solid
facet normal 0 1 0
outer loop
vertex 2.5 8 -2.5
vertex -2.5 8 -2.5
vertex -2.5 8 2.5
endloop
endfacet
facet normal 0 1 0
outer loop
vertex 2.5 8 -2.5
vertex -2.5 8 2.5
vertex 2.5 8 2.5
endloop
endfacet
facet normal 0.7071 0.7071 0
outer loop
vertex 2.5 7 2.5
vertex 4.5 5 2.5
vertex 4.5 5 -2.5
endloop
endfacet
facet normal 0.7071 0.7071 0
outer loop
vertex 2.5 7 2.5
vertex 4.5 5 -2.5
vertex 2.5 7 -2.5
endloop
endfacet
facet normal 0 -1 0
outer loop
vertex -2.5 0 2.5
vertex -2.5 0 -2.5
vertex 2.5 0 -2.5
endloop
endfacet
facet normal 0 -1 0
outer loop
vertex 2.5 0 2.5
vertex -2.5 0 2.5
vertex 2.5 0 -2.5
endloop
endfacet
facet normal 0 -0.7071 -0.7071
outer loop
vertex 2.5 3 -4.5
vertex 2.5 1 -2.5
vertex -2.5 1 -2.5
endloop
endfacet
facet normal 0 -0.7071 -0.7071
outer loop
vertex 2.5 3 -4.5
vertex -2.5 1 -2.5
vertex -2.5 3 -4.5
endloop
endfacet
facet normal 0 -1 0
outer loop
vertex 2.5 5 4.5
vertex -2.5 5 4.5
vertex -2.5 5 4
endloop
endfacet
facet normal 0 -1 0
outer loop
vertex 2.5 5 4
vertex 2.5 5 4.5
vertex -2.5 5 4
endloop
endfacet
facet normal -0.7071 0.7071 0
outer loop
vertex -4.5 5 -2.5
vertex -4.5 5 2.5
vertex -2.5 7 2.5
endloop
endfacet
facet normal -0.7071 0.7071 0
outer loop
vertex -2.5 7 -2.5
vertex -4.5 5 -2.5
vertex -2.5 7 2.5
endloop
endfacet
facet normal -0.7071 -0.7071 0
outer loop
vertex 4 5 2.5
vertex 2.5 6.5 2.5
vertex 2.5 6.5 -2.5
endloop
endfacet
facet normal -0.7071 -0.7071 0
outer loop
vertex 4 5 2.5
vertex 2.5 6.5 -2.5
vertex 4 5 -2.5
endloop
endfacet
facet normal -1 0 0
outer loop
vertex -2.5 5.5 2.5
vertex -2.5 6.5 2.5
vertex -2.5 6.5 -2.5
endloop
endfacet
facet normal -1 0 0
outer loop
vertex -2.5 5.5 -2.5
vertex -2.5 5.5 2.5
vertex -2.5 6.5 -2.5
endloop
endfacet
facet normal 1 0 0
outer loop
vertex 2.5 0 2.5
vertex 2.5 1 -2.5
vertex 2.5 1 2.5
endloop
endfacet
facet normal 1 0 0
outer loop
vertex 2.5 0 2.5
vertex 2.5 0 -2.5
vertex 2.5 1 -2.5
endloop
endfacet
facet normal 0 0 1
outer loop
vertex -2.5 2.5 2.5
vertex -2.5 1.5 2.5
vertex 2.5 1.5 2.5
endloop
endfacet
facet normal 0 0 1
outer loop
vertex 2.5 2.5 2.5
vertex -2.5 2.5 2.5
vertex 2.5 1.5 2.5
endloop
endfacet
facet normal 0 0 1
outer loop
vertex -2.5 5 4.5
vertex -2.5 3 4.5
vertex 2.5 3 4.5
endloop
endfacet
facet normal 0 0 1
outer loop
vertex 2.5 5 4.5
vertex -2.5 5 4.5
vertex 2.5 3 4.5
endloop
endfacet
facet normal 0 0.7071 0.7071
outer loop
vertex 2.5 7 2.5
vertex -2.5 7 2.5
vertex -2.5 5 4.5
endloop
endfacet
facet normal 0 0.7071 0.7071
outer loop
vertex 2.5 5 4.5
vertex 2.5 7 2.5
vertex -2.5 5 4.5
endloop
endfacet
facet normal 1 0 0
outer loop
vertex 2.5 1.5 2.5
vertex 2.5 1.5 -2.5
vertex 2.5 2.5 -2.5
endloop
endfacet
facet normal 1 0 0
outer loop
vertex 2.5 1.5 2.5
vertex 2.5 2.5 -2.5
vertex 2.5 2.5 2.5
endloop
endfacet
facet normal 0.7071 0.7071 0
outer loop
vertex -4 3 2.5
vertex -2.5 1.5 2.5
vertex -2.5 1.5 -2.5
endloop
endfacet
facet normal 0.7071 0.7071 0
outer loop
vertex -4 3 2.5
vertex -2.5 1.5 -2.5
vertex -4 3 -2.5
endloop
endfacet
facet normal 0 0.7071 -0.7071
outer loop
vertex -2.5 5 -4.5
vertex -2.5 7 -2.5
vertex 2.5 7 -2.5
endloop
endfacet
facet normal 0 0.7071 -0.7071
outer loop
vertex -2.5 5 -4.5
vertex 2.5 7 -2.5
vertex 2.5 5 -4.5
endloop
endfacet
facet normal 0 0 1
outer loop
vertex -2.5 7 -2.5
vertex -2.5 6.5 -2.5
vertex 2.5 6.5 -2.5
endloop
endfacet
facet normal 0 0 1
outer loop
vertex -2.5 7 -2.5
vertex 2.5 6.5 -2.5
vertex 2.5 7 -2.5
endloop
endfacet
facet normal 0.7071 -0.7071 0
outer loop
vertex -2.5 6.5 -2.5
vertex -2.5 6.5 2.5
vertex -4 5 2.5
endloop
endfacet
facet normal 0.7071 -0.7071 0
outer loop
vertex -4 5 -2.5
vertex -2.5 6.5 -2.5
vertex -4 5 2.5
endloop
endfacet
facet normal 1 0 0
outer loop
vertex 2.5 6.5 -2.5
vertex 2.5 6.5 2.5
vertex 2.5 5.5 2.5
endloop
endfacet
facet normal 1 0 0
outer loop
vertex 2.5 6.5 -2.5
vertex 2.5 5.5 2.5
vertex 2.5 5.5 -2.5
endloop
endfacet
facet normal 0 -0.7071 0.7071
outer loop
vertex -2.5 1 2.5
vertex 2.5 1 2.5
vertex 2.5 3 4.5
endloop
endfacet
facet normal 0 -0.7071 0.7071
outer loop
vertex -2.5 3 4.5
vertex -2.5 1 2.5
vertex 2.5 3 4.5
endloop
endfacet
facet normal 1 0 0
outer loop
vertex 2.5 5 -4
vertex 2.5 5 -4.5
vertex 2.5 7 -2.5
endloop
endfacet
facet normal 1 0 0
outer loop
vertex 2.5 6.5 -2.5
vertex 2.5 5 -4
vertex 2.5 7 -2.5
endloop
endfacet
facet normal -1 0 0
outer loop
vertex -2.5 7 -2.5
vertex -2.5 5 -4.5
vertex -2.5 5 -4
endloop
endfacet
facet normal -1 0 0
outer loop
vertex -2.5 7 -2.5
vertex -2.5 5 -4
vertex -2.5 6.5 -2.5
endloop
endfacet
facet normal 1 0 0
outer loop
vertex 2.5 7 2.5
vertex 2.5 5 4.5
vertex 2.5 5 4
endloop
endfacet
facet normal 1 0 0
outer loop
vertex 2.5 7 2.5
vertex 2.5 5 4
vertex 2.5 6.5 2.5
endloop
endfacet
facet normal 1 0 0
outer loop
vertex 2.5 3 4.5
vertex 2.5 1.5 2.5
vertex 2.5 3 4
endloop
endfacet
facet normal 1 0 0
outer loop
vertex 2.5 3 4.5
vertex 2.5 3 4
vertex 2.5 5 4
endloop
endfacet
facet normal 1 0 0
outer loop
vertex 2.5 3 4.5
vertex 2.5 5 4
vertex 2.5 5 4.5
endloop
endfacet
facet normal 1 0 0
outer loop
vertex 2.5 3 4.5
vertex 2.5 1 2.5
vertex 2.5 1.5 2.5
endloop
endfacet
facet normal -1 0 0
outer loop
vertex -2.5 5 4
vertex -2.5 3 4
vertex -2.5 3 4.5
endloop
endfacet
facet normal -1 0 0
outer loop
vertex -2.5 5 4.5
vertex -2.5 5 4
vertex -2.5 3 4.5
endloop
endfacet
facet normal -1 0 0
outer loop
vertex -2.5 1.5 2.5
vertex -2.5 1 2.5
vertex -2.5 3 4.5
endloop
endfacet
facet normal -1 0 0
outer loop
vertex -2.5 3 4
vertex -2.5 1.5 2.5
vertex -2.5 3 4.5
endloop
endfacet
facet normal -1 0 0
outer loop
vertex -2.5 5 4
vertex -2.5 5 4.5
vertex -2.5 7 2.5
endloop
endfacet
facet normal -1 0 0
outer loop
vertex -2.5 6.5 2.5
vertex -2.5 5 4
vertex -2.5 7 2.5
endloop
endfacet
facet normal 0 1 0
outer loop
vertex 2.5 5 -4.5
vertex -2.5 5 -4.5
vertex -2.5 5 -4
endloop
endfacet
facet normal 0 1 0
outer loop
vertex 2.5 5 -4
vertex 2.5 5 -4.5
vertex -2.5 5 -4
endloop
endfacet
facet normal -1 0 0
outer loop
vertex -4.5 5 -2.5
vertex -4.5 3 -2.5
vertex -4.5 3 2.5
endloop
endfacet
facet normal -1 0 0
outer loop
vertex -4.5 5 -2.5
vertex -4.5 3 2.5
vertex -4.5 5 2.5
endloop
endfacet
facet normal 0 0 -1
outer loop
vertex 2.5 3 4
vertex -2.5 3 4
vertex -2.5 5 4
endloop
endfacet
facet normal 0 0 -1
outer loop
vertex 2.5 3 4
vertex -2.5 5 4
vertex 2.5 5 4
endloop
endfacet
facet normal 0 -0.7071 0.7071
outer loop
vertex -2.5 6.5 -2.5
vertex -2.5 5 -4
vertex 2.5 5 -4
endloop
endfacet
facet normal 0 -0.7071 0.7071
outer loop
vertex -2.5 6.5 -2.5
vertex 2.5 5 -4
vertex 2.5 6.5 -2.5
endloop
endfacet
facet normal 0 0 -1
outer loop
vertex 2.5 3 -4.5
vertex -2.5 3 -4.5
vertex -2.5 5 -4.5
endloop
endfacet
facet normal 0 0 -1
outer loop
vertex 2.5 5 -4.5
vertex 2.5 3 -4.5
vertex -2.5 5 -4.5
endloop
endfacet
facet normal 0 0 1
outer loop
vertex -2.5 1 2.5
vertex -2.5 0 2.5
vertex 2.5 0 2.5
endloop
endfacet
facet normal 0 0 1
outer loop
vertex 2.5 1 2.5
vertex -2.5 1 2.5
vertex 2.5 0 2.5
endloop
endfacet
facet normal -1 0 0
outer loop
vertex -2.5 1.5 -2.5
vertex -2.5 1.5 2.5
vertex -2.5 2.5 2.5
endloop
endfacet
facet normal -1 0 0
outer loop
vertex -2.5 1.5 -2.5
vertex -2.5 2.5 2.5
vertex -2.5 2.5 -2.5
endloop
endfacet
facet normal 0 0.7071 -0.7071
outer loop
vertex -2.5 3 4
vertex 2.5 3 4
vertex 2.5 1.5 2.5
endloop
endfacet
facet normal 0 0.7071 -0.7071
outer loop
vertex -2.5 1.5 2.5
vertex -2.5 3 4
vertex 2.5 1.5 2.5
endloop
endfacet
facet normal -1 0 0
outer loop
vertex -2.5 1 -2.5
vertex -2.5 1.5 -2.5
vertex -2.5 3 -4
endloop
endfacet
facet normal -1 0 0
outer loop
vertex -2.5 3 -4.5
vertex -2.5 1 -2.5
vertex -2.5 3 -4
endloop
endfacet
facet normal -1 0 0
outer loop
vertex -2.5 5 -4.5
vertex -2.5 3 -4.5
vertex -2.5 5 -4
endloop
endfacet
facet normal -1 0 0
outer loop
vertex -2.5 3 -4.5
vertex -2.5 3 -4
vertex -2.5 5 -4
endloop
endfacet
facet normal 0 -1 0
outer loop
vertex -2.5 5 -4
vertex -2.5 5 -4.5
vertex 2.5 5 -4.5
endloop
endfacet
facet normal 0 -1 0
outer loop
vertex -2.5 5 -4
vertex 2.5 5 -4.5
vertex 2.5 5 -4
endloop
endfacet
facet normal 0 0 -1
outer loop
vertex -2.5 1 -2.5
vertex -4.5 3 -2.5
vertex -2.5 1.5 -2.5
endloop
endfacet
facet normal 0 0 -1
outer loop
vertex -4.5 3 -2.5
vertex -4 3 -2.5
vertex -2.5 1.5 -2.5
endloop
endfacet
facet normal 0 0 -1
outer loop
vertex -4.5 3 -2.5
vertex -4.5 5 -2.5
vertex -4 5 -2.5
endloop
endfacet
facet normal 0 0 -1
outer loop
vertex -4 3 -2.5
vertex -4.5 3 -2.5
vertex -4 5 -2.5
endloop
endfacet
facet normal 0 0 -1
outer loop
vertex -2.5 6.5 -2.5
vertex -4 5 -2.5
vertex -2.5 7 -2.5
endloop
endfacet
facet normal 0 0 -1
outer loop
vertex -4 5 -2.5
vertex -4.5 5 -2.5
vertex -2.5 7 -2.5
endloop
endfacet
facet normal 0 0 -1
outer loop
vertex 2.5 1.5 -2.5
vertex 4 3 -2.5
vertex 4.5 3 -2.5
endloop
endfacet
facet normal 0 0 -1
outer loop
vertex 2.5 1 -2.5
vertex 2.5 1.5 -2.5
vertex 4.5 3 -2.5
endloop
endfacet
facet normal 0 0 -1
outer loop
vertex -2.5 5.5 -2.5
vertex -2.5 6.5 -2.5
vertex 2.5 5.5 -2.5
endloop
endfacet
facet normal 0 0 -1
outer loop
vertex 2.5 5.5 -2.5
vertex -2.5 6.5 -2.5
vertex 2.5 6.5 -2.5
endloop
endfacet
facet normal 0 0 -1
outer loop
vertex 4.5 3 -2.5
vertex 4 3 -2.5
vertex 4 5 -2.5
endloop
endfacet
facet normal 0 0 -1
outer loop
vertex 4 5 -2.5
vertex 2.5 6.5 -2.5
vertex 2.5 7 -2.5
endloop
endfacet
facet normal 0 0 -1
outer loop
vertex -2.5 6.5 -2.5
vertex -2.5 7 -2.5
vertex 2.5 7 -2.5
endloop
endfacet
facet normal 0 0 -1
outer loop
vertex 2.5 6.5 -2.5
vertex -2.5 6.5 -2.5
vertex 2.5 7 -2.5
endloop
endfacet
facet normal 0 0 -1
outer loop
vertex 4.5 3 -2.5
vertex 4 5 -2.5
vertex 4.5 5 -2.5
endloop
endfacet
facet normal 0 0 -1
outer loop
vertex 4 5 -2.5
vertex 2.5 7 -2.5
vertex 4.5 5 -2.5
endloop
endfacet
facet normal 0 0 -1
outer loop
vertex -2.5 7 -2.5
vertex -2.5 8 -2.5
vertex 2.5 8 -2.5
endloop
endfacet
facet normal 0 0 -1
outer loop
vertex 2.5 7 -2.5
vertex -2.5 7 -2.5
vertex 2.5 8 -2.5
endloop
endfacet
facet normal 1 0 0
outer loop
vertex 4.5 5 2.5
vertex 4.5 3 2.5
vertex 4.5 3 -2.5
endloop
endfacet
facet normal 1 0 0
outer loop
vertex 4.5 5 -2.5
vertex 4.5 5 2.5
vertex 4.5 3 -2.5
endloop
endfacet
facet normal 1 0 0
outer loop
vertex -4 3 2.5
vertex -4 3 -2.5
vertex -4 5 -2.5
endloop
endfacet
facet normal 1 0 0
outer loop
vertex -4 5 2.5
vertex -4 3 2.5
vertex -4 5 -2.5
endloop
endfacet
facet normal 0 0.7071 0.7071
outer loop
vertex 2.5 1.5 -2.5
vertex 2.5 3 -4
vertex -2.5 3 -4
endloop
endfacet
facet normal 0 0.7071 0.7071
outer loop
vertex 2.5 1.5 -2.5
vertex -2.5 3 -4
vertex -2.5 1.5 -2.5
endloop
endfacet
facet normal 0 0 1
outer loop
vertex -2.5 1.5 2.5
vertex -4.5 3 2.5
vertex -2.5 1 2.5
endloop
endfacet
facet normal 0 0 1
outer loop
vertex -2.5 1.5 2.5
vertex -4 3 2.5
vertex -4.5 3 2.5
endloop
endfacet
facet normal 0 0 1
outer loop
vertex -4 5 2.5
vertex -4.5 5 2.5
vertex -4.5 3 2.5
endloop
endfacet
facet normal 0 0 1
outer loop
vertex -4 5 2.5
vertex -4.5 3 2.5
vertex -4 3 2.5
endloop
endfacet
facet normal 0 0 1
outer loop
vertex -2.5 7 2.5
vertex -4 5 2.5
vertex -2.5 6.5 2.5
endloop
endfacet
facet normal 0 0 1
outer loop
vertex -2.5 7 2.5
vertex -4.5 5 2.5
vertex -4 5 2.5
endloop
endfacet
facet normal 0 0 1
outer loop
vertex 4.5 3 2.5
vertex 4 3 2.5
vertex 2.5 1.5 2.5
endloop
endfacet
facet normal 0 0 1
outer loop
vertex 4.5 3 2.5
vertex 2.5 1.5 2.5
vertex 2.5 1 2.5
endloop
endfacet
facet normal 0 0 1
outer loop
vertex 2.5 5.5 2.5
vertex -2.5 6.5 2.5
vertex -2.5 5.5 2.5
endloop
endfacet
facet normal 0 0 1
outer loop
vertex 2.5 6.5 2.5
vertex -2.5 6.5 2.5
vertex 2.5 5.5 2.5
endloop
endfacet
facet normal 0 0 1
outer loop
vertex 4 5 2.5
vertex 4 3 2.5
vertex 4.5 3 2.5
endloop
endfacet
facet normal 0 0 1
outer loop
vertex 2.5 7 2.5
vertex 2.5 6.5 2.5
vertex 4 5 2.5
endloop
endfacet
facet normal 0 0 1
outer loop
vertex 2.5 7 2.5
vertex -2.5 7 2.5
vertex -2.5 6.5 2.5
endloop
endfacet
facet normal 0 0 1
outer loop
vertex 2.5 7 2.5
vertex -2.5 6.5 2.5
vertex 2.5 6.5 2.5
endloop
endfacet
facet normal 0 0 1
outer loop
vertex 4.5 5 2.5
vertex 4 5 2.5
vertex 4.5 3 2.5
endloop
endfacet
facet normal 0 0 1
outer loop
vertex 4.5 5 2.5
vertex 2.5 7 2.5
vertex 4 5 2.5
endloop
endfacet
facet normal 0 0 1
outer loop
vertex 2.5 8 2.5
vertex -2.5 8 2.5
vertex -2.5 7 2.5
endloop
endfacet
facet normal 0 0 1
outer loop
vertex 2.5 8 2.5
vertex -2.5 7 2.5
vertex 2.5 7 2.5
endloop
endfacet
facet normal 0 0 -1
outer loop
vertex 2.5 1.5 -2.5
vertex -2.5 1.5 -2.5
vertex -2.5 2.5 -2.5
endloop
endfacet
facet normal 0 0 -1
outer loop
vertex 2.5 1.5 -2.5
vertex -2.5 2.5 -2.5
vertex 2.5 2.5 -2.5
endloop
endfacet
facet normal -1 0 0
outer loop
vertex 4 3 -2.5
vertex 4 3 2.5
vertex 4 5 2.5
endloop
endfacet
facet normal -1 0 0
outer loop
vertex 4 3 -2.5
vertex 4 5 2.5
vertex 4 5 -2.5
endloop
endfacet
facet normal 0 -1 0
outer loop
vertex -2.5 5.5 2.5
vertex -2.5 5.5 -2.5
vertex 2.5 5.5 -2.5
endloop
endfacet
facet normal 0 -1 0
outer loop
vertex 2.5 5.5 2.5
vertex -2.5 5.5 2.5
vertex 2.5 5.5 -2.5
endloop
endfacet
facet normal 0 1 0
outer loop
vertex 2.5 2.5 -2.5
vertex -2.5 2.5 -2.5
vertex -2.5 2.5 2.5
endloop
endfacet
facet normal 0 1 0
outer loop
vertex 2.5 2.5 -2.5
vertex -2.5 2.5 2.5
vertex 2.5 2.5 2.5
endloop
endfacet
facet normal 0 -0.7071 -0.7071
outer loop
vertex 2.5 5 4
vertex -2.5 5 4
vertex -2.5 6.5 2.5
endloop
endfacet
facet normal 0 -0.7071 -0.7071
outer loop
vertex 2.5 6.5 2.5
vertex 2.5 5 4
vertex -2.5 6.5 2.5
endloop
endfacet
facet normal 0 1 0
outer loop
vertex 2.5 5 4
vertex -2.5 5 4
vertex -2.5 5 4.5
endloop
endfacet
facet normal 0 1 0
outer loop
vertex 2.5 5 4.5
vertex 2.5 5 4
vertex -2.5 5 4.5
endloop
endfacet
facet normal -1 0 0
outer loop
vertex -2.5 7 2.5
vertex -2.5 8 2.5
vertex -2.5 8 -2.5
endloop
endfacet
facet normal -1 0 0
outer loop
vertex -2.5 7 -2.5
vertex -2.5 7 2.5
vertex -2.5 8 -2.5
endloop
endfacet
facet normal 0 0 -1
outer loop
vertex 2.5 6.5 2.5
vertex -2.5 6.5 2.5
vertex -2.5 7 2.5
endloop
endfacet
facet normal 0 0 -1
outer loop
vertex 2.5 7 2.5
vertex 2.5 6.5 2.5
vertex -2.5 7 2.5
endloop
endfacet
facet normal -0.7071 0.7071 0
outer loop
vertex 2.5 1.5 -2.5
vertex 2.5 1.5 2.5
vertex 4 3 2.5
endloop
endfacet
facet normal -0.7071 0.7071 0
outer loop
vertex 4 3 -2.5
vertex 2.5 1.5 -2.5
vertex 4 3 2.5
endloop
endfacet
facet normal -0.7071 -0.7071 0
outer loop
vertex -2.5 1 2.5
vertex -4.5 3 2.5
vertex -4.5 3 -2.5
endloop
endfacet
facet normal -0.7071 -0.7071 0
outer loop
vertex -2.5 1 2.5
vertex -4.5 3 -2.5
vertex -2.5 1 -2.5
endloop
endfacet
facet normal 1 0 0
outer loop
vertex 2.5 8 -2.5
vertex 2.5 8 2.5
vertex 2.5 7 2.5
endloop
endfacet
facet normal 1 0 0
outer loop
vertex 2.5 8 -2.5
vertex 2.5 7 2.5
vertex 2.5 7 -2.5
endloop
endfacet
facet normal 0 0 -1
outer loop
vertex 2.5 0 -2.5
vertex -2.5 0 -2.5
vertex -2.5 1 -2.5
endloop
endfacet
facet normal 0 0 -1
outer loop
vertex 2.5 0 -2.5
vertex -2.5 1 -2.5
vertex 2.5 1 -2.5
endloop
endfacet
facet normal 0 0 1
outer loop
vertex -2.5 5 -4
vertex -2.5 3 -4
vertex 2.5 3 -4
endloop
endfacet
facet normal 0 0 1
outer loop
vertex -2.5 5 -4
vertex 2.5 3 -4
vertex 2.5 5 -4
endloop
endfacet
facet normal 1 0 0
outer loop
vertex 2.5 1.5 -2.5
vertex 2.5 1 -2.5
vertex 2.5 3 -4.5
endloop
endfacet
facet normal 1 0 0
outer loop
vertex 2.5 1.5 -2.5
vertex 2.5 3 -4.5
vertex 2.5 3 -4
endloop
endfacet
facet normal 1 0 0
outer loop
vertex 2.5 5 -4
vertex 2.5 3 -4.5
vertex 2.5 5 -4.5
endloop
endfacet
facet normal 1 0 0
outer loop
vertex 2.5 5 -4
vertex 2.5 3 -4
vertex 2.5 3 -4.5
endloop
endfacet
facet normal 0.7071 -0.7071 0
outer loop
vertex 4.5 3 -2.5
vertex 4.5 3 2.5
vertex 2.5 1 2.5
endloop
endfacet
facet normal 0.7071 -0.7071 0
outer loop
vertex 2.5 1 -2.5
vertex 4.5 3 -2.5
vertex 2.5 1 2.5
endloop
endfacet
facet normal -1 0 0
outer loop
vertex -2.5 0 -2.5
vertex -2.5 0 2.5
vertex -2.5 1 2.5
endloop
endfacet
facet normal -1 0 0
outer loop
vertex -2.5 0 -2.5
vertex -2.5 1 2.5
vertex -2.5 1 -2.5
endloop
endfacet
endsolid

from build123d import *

# Parameters (mm, degrees)
SKETCH2_W            = 5
SKETCH2_H            = 5
BOSS_EXTRUDE1_DEPTH  = 2.5
BOSS_EXTRUDE2_DEPTH  = 5
BOSS_EXTRUDE3_DEPTH  = 5
SKETCH5_W            = 0.5
SKETCH5_H            = 5
BOSS_EXTRUDE4_DEPTH  = 1
SKETCH6_W            = 5
SKETCH6_H            = 0.5
BOSS_EXTRUDE5_DEPTH  = 1
MIRROR3_START        = -2.5
MIRROR3_OUTLINE_W    = 0.5
MIRROR3_OUTLINE_H    = 1
MIRROR3_DEPTH        = 5
MIRROR5_COPY_1_DEPTH = 5
MIRROR5_COPY_2_DEPTH = 5
MIRROR6_START        = -2.5
MIRROR6_OUTLINE_W    = 1
MIRROR6_OUTLINE_H    = 0.5
MIRROR6_DEPTH        = 5
BOSS_EXTRUDE7_DEPTH  = 5
BOSS_EXTRUDE9_DEPTH  = 5


# Read off the part's stored shape, not the designer's step: Mirror3, Mirror6
with BuildPart() as part:
    # Sketch2 → Boss-Extrude1 (new body)
    with BuildSketch(Plane(origin=(0, 0, 0), x_dir=(1, 0, 0), z_dir=(0, 1, 0))):
        Rectangle(SKETCH2_W, SKETCH2_H)
    boss_extrude1 = extrude(amount=BOSS_EXTRUDE1_DEPTH)

    # Sketch3 → Boss-Extrude2 (add)
    with BuildSketch(Plane.XY.offset(2.5)):
        Polygon((-2.5, 1.5), (-4, 3), (-4.5, 3), (-2.5, 1), align=None)
    boss_extrude2 = extrude(amount=-BOSS_EXTRUDE2_DEPTH)

    # Sketch4 → Boss-Extrude3 (add)
    with BuildSketch(Plane(origin=(2.5, 0, 0), x_dir=(0, 0, -1), z_dir=(1, 0, 0))):
        Polygon((2.5, 1.5), (2.5, 1), (4.5, 3), (4, 3), align=None)
    boss_extrude3 = extrude(amount=-BOSS_EXTRUDE3_DEPTH)

    # Sketch5 → Boss-Extrude4 (add)
    with BuildSketch(Plane(origin=(0, 3, 0), x_dir=(1, 0, 0), z_dir=(0, 1, 0))):
        with Locations((-4.25, 0)):
            Rectangle(SKETCH5_W, SKETCH5_H)
    boss_extrude4 = extrude(amount=BOSS_EXTRUDE4_DEPTH)

    # Sketch6 → Boss-Extrude5 (add)
    with BuildSketch(Plane(origin=(0, 3, 0), x_dir=(1, 0, 0), z_dir=(0, 1, 0))):
        with Locations((0, 4.25)):
            Rectangle(SKETCH6_W, SKETCH6_H)
    boss_extrude5 = extrude(amount=BOSS_EXTRUDE5_DEPTH)

    # Mirror1: Boss-Extrude3, Boss-Extrude5 across plane
    add(boss_extrude3.mirror(Plane.XY))
    add(boss_extrude5.mirror(Plane.XY))

    # Mirror2: Boss-Extrude2, Boss-Extrude4 across plane
    add(boss_extrude2.mirror(Plane(origin=(0, 0, 0), x_dir=(0, 0, 1), z_dir=(1, 0, 0))))
    add(boss_extrude4.mirror(Plane(origin=(0, 0, 0), x_dir=(0, 0, 1), z_dir=(1, 0, 0))))

    # Mirror3 outline → Mirror3 (add)
    with BuildSketch(Plane.XY.offset(MIRROR3_START)):
        with Locations((-4.25, 4.5)):
            Rectangle(MIRROR3_OUTLINE_W, MIRROR3_OUTLINE_H)
        with Locations((4.25, 4.5)):
            Rectangle(MIRROR3_OUTLINE_W, MIRROR3_OUTLINE_H)
    extrude(amount=MIRROR3_DEPTH)

    # Mirror4: Boss-Extrude2 across plane
    add(boss_extrude2.mirror(Plane.ZX.offset(4)))

    # Mirror5 copy 1 sketch → Mirror5 copy 1 (add)
    with BuildSketch(Plane(origin=(0, 8, 2.5), x_dir=(-1, 0, 0), z_dir=(0, 0, 1))):
        Polygon((-2.5, 1.5), (-4, 3), (-4.5, 3), (-2.5, 1), align=None)
    extrude(amount=-MIRROR5_COPY_1_DEPTH)

    # Mirror5 copy 2 sketch → Mirror5 copy 2 (add)
    with BuildSketch(Plane(origin=(0, 0, 2.5), x_dir=(-1, 0, 0), z_dir=(0, 0, 1))):
        Polygon((-2.5, -1.5), (-4, -3), (-4.5, -3), (-2.5, -1), align=None)
    extrude(amount=-MIRROR5_COPY_2_DEPTH)

    # Mirror6 outline → Mirror6 (add)
    with BuildSketch(Plane.YZ.offset(MIRROR6_START)):
        with Locations((4.5, -4.25)):
            Rectangle(MIRROR6_OUTLINE_W, MIRROR6_OUTLINE_H)
        with Locations((4.5, 4.25)):
            Rectangle(MIRROR6_OUTLINE_W, MIRROR6_OUTLINE_H)
    extrude(amount=MIRROR6_DEPTH)

    # Mirror10: Boss-Extrude1 across plane
    add(boss_extrude1.mirror(Plane.ZX.offset(4)))


with BuildPart() as body_2:
    # Sketch7 → Boss-Extrude7 (new body)
    with BuildSketch(Plane.ZY.offset(2.5)):
        Polygon((-4.5, 5), (-4, 5), (-2.5, 6.5), (-2.5, 7), align=None)
    extrude(amount=-BOSS_EXTRUDE7_DEPTH)


with BuildPart() as body_3:
    # Sketch8 → Boss-Extrude9 (new body)
    with BuildSketch(Plane.ZY.offset(2.5)):
        Polygon((4.5, 5), (4, 5), (2.5, 6.5), (2.5, 7), align=None)
    extrude(amount=-BOSS_EXTRUDE9_DEPTH)


solid = Compound([part.part, body_2.part, body_3.part])
